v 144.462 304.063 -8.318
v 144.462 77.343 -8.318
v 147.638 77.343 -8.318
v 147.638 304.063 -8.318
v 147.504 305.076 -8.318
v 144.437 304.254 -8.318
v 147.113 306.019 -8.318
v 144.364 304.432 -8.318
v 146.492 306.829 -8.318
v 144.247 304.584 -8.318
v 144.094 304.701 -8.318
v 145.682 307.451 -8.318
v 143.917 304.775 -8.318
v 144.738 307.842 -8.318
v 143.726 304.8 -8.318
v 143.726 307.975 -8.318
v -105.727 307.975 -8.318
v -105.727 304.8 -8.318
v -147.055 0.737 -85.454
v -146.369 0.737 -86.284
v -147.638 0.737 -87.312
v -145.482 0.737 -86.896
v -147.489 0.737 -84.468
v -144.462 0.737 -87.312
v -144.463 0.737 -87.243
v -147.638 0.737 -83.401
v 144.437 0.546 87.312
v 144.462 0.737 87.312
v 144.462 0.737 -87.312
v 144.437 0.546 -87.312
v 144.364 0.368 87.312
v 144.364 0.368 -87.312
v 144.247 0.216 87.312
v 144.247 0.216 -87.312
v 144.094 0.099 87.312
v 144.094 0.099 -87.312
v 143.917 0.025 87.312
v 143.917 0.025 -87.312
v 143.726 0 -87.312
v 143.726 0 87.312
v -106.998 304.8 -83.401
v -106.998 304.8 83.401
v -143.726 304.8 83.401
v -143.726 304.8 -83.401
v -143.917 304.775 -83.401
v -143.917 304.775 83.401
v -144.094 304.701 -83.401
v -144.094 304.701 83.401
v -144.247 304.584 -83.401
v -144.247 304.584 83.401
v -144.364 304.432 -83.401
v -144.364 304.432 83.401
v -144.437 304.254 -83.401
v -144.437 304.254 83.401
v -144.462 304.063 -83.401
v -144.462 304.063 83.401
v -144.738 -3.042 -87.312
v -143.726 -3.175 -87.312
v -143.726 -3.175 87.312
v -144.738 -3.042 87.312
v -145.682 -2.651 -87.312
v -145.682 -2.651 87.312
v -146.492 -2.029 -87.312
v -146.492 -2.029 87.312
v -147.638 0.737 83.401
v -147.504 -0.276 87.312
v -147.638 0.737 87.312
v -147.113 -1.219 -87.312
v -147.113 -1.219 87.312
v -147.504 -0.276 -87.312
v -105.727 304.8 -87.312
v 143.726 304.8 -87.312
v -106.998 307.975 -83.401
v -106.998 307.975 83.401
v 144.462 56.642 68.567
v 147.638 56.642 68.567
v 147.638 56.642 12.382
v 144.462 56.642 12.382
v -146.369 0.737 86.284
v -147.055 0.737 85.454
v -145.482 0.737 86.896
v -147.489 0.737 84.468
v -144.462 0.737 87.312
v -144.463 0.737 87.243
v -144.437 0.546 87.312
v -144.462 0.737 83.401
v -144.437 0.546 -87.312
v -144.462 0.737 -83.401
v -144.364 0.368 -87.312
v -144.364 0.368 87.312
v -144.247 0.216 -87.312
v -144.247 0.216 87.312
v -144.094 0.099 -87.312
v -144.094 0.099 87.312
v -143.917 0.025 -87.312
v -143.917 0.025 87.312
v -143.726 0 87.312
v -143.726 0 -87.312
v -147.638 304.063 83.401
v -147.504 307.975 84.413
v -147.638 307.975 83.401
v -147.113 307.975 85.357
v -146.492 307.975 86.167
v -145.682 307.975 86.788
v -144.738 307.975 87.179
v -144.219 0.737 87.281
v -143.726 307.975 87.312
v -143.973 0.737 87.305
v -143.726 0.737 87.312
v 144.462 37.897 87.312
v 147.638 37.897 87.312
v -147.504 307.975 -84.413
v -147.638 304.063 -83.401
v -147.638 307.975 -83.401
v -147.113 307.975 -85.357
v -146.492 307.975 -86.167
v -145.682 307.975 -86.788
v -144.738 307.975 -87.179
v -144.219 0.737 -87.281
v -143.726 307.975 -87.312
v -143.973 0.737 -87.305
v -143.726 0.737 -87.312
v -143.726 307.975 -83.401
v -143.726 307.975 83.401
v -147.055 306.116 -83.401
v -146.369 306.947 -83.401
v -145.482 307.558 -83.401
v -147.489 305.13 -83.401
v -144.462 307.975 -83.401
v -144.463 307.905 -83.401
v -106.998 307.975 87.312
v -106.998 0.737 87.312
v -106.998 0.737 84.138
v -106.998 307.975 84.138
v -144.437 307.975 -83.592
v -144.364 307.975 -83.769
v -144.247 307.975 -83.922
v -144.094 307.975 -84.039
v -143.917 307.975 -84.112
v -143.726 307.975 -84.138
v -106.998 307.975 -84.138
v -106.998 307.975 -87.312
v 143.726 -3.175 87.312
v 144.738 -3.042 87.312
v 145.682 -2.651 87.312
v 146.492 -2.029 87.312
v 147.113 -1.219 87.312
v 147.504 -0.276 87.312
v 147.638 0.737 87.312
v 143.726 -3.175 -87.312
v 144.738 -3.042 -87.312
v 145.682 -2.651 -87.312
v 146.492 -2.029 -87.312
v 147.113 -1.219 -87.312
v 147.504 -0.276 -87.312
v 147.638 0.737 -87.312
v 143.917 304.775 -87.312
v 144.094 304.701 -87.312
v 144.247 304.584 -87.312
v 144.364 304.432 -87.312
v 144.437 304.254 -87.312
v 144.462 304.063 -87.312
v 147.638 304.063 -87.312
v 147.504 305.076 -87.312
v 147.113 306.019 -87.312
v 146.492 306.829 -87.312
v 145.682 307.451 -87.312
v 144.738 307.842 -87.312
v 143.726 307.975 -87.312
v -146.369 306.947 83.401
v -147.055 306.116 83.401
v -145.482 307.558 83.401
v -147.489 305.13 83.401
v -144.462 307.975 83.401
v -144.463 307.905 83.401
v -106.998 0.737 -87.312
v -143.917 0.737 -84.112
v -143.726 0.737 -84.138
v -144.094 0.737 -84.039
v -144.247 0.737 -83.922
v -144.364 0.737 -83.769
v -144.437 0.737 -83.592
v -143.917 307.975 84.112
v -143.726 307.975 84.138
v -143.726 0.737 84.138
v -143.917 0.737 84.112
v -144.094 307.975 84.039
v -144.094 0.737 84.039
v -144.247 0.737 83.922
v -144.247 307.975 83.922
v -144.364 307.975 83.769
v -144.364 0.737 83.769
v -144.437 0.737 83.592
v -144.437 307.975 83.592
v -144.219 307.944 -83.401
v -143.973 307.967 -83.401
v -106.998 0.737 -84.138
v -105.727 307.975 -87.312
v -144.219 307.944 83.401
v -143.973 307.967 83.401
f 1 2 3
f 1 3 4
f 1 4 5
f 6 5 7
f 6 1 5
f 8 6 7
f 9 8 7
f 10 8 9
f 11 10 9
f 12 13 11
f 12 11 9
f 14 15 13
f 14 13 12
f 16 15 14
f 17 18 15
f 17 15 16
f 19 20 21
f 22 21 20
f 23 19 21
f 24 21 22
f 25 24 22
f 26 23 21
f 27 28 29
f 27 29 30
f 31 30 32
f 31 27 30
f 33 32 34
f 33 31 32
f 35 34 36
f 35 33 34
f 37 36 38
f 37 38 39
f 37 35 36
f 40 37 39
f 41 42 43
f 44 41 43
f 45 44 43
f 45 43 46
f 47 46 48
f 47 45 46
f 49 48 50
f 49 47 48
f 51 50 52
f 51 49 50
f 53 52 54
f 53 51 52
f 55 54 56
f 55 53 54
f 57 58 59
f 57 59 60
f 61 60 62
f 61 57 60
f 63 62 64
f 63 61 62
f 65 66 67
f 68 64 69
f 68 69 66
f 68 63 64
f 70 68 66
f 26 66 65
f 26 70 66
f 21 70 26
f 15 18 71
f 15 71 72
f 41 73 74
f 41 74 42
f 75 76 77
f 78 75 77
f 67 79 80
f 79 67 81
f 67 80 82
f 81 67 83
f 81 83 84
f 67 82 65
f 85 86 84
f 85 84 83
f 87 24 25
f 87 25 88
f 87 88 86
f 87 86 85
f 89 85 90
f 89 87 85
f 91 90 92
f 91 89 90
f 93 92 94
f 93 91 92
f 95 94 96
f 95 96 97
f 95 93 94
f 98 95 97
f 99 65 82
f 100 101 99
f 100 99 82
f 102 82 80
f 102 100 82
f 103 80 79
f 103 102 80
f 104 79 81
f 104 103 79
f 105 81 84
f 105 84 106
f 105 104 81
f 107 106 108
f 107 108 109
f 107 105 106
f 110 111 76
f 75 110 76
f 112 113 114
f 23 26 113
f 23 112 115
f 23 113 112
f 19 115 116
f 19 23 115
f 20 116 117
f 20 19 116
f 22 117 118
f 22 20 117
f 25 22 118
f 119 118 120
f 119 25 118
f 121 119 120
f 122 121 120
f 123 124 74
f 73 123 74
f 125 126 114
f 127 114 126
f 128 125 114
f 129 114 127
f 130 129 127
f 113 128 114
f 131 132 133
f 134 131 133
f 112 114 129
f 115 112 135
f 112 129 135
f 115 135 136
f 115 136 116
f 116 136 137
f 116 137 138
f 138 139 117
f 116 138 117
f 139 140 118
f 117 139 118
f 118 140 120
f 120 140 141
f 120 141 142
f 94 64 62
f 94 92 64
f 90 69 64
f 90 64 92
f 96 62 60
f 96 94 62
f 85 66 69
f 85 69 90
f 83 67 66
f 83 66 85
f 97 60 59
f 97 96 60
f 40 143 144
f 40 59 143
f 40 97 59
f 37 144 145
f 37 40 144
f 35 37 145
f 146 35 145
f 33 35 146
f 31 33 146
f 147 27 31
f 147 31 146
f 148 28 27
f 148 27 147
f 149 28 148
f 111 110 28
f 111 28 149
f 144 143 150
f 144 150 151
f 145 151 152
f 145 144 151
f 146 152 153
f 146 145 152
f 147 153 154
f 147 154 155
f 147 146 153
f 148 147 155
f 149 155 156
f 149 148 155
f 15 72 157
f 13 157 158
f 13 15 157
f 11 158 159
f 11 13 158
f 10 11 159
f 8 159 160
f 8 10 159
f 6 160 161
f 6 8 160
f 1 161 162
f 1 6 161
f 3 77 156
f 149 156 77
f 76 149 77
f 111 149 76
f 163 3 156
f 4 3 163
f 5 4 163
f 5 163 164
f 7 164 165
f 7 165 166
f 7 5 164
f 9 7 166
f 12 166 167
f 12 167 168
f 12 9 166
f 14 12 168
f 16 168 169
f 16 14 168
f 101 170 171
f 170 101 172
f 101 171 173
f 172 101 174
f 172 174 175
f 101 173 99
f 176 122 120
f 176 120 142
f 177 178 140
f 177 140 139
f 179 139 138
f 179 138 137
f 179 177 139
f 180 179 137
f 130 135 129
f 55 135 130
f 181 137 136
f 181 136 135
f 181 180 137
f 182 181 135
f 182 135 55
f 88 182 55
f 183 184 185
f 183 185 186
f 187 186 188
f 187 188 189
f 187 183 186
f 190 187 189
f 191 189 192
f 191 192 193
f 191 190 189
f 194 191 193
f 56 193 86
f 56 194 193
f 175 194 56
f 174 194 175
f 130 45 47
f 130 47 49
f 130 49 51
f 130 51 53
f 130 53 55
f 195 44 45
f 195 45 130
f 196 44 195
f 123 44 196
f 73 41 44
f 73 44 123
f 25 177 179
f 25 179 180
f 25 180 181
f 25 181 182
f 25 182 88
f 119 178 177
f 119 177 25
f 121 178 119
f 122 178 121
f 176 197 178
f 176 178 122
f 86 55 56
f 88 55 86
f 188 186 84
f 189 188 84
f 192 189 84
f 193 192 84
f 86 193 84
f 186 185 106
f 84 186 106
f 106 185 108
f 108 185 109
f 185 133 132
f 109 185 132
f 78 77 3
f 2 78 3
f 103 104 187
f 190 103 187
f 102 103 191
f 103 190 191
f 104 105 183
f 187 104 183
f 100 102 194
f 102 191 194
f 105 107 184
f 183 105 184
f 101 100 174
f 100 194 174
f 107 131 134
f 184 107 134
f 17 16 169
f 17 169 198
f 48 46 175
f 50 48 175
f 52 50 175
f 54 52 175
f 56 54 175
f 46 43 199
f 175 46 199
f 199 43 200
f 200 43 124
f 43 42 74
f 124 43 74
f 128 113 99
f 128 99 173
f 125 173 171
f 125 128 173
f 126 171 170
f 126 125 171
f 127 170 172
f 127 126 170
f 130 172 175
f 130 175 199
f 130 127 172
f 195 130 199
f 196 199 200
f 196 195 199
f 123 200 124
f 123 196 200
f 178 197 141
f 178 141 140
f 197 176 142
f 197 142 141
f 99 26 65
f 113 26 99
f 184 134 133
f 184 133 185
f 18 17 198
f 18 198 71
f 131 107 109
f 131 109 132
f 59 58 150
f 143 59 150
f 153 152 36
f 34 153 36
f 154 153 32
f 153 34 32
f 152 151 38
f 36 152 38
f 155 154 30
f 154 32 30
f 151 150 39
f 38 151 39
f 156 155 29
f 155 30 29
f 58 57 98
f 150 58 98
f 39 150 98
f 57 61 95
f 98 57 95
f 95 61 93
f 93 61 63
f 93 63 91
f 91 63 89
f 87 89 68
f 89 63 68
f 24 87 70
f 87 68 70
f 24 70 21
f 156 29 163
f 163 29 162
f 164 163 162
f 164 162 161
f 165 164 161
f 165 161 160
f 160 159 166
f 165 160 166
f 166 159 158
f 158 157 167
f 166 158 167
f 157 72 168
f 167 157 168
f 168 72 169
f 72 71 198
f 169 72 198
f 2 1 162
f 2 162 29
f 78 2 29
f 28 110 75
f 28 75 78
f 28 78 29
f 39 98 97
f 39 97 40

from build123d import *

# Parameters (mm, degrees)
SKETCH1_W                    = 295.275
SKETCH1_H                    = 174.625
BASE_FLANGE1_DEPTH           = 3.175
EDGE_FLANGE1_STRIP_W         = 14.1732
EDGE_FLANGE1_STRIP_H         = 3.175
EDGE_FLANGE1_STRIP_CUT_DEPTH = 174.625
EDGE_FLANGE1_DEPTH           = 174.625
EDGE_FLANGE2_STRIP_W         = 14.1732
EDGE_FLANGE2_STRIP_H         = 3.175
EDGE_FLANGE2_STRIP_CUT_DEPTH = 307.2384
EDGE_FLANGE2_DEPTH           = 307.2384
EDGE_FLANGE3_STRIP_W         = 14.1732
EDGE_FLANGE3_STRIP_H         = 3.175
EDGE_FLANGE3_STRIP_CUT_DEPTH = 307.2384
EDGE_FLANGE3_DEPTH           = 307.2384
EDGE_FLANGE4_STRIP_W         = 14.1732
EDGE_FLANGE4_STRIP_H         = 3.175
EDGE_FLANGE4_STRIP_CUT_DEPTH = 166.8018
EDGE_FLANGE4_DEPTH           = 166.8018
EDGE_FLANGE5_STRIP_W         = 14.1732
EDGE_FLANGE5_STRIP_H         = 3.175
EDGE_FLANGE5_STRIP_CUT_DEPTH = 174.625
EDGE_FLANGE5_DEPTH           = 174.625
CUT_EXTRUDE1_REACH           = 437.499
EDGE_FLANGE7_STRIP_W         = 14.1732
EDGE_FLANGE7_STRIP_H         = 3.175
EDGE_FLANGE7_STRIP_CUT_DEPTH = 78.994
EDGE_FLANGE7_DEPTH           = 78.994


# Sheet-metal steps are written as plain solids
with BuildPart() as part:
    # Sketch1 → Base-Flange1 (new body)
    with BuildSketch(Plane(origin=(0, 0, 0), x_dir=(1, 0, 0), z_dir=(0, 1, 0))):
        Rectangle(SKETCH1_W, SKETCH1_H)
    extrude(amount=-BASE_FLANGE1_DEPTH)

    # Edge-Flange1 strip (across the edge) → Edge-Flange1 strip cut (cut)
    with BuildSketch(Plane(origin=(-147.6375, 0, -87.3125), x_dir=(1, 0, 0), z_dir=(0, 0, 1))):
        with Locations((-3.175, -1.5875)):
            Rectangle(EDGE_FLANGE1_STRIP_W, EDGE_FLANGE1_STRIP_H)
    extrude(amount=EDGE_FLANGE1_STRIP_CUT_DEPTH, mode=Mode.SUBTRACT)

    # Edge-Flange1 section (across the edge) → Edge-Flange1 (add)
    with BuildSketch(Plane(origin=(-147.6375, 0, -87.3125), x_dir=(1, 0, 0), z_dir=(0, 0, 1))):
        with BuildLine():
            Line((0, 0.7366), (0, 307.975))
            Line((0, 307.975), (3.175, 307.975))
            Line((3.175, 307.975), (3.175, 0.7366))
            ThreePointArc((3.175, 0.7366), (3.390745145, 0.215745145), (3.9116, 0))
            Line((3.9116, 0), (3.9116, -3.175))
            ThreePointArc((3.9116, -3.175), (1.145681115, -2.029318885), (0, 0.7366))
        make_face()
    extrude(amount=EDGE_FLANGE1_DEPTH)

    # Edge-Flange2 strip (across the edge) → Edge-Flange2 strip cut (cut)
    with BuildSketch(Plane(origin=(-144.4625, 307.975, 87.3125), x_dir=(0, 0, -1), z_dir=(0, -1, 0))):
        with Locations((-3.175, -1.5875)):
            Rectangle(EDGE_FLANGE2_STRIP_W, EDGE_FLANGE2_STRIP_H)
    extrude(amount=EDGE_FLANGE2_STRIP_CUT_DEPTH, mode=Mode.SUBTRACT)

    # Edge-Flange2 section (across the edge) → Edge-Flange2 (add)
    with BuildSketch(Plane(origin=(-144.4625, 307.975, 87.3125), x_dir=(0, 0, -1), z_dir=(0, -1, 0))):
        with BuildLine():
            Line((0, 0.7366), (0, 37.465))
            Line((0, 37.465), (3.175, 37.465))
            Line((3.175, 37.465), (3.175, 0.7366))
            ThreePointArc((3.175, 0.7366), (3.390745145, 0.215745145), (3.9116, 0))
            Line((3.9116, 0), (3.9116, -3.175))
            ThreePointArc((3.9116, -3.175), (1.145681115, -2.029318885), (0, 0.7366))
        make_face()
    extrude(amount=EDGE_FLANGE2_DEPTH)

    # Edge-Flange3 strip (across the edge) → Edge-Flange3 strip cut (cut)
    with BuildSketch(Plane(origin=(-144.4625, 0.7366, -87.3125), x_dir=(0, 0, 1), z_dir=(0, 1, 0))):
        with Locations((-3.175, -1.5875)):
            Rectangle(EDGE_FLANGE3_STRIP_W, EDGE_FLANGE3_STRIP_H)
    extrude(amount=EDGE_FLANGE3_STRIP_CUT_DEPTH, mode=Mode.SUBTRACT)

    # Edge-Flange3 section (across the edge) → Edge-Flange3 (add)
    with BuildSketch(Plane(origin=(-144.4625, 0.7366, -87.3125), x_dir=(0, 0, 1), z_dir=(0, 1, 0))):
        with BuildLine():
            Line((0, 0.7366), (0, 37.465))
            Line((0, 37.465), (3.175, 37.465))
            Line((3.175, 37.465), (3.175, 0.7366))
            ThreePointArc((3.175, 0.7366), (3.390745145, 0.215745145), (3.9116, 0))
            Line((3.9116, 0), (3.9116, -3.175))
            ThreePointArc((3.9116, -3.175), (1.145681115, -2.029318885), (0, 0.7366))
        make_face()
    extrude(amount=EDGE_FLANGE3_DEPTH)

    # Edge-Flange4 strip (across the edge) → Edge-Flange4 strip cut (cut)
    with BuildSketch(Plane(origin=(-144.4625, 307.975, -83.4009), x_dir=(0, -1, 0), z_dir=(0, 0, 1))):
        with Locations((-3.175, -1.5875)):
            Rectangle(EDGE_FLANGE4_STRIP_W, EDGE_FLANGE4_STRIP_H)
    extrude(amount=EDGE_FLANGE4_STRIP_CUT_DEPTH, mode=Mode.SUBTRACT)

    # Edge-Flange4 section (across the edge) → Edge-Flange4 (add)
    with BuildSketch(Plane(origin=(-144.4625, 307.975, -83.4009), x_dir=(0, -1, 0), z_dir=(0, 0, 1))):
        with BuildLine():
            Line((0, 0.7366), (0, 37.465))
            Line((0, 37.465), (3.175, 37.465))
            Line((3.175, 37.465), (3.175, 0.7366))
            ThreePointArc((3.175, 0.7366), (3.390745145, 0.215745145), (3.9116, 0))
            Line((3.9116, 0), (3.9116, -3.175))
            ThreePointArc((3.9116, -3.175), (1.145681115, -2.029318885), (0, 0.7366))
        make_face()
    extrude(amount=EDGE_FLANGE4_DEPTH)

    # Edge-Flange5 strip (across the edge) → Edge-Flange5 strip cut (cut)
    with BuildSketch(Plane(origin=(147.6375, 0, 87.3125), x_dir=(-1, 0, 0), z_dir=(0, 0, -1))):
        with Locations((-3.175, -1.5875)):
            Rectangle(EDGE_FLANGE5_STRIP_W, EDGE_FLANGE5_STRIP_H)
    extrude(amount=EDGE_FLANGE5_STRIP_CUT_DEPTH, mode=Mode.SUBTRACT)

    # Edge-Flange5 section (across the edge) → Edge-Flange5 (add)
    with BuildSketch(Plane(origin=(147.6375, 0, 87.3125), x_dir=(-1, 0, 0), z_dir=(0, 0, -1))):
        with BuildLine():
            Line((0, 0.7366), (0, 307.975))
            Line((0, 307.975), (3.175, 307.975))
            Line((3.175, 307.975), (3.175, 0.7366))
            ThreePointArc((3.175, 0.7366), (3.390745145, 0.215745145), (3.9116, 0))
            Line((3.9116, 0), (3.9116, -3.175))
            ThreePointArc((3.9116, -3.175), (1.145681115, -2.029318885), (0, 0.7366))
        make_face()
    extrude(amount=EDGE_FLANGE5_DEPTH)

    # Sketch29 → Cut-Extrude1 (cut, up to next)
    with BuildSketch(Plane(origin=(147.6375, 0, 0), x_dir=(0, 0, -1), z_dir=(1, 0, 0)), mode=Mode.PRIVATE) as cut_extrude1_sk1:
        Polygon((-87.3125, 37.8968), (-68.5673, 56.642), (-12.3825, 56.642), (8.3185, 77.343), (8.3185, 307.975), (-87.3125, 307.975), align=None)
    cut_extrude1_tool1 = extrude(cut_extrude1_sk1.sketch, amount=-CUT_EXTRUDE1_REACH, mode=Mode.PRIVATE) & part.part
    add(cut_extrude1_tool1.solids().sort_by_distance((147.6375, 182.403147, 40.166664))[0], mode=Mode.SUBTRACT)

    # Edge-Flange7 strip (across the edge) → Edge-Flange7 strip cut (cut)
    with BuildSketch(Plane(origin=(144.4625, 307.975, -8.3185), x_dir=(0, -1, 0), z_dir=(0, 0, -1))):
        with Locations((-3.175, -1.5875)):
            Rectangle(EDGE_FLANGE7_STRIP_W, EDGE_FLANGE7_STRIP_H)
    extrude(amount=EDGE_FLANGE7_STRIP_CUT_DEPTH, mode=Mode.SUBTRACT)

    # Edge-Flange7 section (across the edge) → Edge-Flange7 (add)
    with BuildSketch(Plane(origin=(144.4625, 307.975, -8.3185), x_dir=(0, -1, 0), z_dir=(0, 0, -1))):
        with BuildLine():
            Line((0, 0.7366), (0, 250.19))
            Line((0, 250.19), (3.175, 250.19))
            Line((3.175, 250.19), (3.175, 0.7366))
            ThreePointArc((3.175, 0.7366), (3.390745145, 0.215745145), (3.9116, 0))
            Line((3.9116, 0), (3.9116, -3.175))
            ThreePointArc((3.9116, -3.175), (1.145681115, -2.029318885), (0, 0.7366))
        make_face()
    extrude(amount=EDGE_FLANGE7_DEPTH)


solid = part.part
